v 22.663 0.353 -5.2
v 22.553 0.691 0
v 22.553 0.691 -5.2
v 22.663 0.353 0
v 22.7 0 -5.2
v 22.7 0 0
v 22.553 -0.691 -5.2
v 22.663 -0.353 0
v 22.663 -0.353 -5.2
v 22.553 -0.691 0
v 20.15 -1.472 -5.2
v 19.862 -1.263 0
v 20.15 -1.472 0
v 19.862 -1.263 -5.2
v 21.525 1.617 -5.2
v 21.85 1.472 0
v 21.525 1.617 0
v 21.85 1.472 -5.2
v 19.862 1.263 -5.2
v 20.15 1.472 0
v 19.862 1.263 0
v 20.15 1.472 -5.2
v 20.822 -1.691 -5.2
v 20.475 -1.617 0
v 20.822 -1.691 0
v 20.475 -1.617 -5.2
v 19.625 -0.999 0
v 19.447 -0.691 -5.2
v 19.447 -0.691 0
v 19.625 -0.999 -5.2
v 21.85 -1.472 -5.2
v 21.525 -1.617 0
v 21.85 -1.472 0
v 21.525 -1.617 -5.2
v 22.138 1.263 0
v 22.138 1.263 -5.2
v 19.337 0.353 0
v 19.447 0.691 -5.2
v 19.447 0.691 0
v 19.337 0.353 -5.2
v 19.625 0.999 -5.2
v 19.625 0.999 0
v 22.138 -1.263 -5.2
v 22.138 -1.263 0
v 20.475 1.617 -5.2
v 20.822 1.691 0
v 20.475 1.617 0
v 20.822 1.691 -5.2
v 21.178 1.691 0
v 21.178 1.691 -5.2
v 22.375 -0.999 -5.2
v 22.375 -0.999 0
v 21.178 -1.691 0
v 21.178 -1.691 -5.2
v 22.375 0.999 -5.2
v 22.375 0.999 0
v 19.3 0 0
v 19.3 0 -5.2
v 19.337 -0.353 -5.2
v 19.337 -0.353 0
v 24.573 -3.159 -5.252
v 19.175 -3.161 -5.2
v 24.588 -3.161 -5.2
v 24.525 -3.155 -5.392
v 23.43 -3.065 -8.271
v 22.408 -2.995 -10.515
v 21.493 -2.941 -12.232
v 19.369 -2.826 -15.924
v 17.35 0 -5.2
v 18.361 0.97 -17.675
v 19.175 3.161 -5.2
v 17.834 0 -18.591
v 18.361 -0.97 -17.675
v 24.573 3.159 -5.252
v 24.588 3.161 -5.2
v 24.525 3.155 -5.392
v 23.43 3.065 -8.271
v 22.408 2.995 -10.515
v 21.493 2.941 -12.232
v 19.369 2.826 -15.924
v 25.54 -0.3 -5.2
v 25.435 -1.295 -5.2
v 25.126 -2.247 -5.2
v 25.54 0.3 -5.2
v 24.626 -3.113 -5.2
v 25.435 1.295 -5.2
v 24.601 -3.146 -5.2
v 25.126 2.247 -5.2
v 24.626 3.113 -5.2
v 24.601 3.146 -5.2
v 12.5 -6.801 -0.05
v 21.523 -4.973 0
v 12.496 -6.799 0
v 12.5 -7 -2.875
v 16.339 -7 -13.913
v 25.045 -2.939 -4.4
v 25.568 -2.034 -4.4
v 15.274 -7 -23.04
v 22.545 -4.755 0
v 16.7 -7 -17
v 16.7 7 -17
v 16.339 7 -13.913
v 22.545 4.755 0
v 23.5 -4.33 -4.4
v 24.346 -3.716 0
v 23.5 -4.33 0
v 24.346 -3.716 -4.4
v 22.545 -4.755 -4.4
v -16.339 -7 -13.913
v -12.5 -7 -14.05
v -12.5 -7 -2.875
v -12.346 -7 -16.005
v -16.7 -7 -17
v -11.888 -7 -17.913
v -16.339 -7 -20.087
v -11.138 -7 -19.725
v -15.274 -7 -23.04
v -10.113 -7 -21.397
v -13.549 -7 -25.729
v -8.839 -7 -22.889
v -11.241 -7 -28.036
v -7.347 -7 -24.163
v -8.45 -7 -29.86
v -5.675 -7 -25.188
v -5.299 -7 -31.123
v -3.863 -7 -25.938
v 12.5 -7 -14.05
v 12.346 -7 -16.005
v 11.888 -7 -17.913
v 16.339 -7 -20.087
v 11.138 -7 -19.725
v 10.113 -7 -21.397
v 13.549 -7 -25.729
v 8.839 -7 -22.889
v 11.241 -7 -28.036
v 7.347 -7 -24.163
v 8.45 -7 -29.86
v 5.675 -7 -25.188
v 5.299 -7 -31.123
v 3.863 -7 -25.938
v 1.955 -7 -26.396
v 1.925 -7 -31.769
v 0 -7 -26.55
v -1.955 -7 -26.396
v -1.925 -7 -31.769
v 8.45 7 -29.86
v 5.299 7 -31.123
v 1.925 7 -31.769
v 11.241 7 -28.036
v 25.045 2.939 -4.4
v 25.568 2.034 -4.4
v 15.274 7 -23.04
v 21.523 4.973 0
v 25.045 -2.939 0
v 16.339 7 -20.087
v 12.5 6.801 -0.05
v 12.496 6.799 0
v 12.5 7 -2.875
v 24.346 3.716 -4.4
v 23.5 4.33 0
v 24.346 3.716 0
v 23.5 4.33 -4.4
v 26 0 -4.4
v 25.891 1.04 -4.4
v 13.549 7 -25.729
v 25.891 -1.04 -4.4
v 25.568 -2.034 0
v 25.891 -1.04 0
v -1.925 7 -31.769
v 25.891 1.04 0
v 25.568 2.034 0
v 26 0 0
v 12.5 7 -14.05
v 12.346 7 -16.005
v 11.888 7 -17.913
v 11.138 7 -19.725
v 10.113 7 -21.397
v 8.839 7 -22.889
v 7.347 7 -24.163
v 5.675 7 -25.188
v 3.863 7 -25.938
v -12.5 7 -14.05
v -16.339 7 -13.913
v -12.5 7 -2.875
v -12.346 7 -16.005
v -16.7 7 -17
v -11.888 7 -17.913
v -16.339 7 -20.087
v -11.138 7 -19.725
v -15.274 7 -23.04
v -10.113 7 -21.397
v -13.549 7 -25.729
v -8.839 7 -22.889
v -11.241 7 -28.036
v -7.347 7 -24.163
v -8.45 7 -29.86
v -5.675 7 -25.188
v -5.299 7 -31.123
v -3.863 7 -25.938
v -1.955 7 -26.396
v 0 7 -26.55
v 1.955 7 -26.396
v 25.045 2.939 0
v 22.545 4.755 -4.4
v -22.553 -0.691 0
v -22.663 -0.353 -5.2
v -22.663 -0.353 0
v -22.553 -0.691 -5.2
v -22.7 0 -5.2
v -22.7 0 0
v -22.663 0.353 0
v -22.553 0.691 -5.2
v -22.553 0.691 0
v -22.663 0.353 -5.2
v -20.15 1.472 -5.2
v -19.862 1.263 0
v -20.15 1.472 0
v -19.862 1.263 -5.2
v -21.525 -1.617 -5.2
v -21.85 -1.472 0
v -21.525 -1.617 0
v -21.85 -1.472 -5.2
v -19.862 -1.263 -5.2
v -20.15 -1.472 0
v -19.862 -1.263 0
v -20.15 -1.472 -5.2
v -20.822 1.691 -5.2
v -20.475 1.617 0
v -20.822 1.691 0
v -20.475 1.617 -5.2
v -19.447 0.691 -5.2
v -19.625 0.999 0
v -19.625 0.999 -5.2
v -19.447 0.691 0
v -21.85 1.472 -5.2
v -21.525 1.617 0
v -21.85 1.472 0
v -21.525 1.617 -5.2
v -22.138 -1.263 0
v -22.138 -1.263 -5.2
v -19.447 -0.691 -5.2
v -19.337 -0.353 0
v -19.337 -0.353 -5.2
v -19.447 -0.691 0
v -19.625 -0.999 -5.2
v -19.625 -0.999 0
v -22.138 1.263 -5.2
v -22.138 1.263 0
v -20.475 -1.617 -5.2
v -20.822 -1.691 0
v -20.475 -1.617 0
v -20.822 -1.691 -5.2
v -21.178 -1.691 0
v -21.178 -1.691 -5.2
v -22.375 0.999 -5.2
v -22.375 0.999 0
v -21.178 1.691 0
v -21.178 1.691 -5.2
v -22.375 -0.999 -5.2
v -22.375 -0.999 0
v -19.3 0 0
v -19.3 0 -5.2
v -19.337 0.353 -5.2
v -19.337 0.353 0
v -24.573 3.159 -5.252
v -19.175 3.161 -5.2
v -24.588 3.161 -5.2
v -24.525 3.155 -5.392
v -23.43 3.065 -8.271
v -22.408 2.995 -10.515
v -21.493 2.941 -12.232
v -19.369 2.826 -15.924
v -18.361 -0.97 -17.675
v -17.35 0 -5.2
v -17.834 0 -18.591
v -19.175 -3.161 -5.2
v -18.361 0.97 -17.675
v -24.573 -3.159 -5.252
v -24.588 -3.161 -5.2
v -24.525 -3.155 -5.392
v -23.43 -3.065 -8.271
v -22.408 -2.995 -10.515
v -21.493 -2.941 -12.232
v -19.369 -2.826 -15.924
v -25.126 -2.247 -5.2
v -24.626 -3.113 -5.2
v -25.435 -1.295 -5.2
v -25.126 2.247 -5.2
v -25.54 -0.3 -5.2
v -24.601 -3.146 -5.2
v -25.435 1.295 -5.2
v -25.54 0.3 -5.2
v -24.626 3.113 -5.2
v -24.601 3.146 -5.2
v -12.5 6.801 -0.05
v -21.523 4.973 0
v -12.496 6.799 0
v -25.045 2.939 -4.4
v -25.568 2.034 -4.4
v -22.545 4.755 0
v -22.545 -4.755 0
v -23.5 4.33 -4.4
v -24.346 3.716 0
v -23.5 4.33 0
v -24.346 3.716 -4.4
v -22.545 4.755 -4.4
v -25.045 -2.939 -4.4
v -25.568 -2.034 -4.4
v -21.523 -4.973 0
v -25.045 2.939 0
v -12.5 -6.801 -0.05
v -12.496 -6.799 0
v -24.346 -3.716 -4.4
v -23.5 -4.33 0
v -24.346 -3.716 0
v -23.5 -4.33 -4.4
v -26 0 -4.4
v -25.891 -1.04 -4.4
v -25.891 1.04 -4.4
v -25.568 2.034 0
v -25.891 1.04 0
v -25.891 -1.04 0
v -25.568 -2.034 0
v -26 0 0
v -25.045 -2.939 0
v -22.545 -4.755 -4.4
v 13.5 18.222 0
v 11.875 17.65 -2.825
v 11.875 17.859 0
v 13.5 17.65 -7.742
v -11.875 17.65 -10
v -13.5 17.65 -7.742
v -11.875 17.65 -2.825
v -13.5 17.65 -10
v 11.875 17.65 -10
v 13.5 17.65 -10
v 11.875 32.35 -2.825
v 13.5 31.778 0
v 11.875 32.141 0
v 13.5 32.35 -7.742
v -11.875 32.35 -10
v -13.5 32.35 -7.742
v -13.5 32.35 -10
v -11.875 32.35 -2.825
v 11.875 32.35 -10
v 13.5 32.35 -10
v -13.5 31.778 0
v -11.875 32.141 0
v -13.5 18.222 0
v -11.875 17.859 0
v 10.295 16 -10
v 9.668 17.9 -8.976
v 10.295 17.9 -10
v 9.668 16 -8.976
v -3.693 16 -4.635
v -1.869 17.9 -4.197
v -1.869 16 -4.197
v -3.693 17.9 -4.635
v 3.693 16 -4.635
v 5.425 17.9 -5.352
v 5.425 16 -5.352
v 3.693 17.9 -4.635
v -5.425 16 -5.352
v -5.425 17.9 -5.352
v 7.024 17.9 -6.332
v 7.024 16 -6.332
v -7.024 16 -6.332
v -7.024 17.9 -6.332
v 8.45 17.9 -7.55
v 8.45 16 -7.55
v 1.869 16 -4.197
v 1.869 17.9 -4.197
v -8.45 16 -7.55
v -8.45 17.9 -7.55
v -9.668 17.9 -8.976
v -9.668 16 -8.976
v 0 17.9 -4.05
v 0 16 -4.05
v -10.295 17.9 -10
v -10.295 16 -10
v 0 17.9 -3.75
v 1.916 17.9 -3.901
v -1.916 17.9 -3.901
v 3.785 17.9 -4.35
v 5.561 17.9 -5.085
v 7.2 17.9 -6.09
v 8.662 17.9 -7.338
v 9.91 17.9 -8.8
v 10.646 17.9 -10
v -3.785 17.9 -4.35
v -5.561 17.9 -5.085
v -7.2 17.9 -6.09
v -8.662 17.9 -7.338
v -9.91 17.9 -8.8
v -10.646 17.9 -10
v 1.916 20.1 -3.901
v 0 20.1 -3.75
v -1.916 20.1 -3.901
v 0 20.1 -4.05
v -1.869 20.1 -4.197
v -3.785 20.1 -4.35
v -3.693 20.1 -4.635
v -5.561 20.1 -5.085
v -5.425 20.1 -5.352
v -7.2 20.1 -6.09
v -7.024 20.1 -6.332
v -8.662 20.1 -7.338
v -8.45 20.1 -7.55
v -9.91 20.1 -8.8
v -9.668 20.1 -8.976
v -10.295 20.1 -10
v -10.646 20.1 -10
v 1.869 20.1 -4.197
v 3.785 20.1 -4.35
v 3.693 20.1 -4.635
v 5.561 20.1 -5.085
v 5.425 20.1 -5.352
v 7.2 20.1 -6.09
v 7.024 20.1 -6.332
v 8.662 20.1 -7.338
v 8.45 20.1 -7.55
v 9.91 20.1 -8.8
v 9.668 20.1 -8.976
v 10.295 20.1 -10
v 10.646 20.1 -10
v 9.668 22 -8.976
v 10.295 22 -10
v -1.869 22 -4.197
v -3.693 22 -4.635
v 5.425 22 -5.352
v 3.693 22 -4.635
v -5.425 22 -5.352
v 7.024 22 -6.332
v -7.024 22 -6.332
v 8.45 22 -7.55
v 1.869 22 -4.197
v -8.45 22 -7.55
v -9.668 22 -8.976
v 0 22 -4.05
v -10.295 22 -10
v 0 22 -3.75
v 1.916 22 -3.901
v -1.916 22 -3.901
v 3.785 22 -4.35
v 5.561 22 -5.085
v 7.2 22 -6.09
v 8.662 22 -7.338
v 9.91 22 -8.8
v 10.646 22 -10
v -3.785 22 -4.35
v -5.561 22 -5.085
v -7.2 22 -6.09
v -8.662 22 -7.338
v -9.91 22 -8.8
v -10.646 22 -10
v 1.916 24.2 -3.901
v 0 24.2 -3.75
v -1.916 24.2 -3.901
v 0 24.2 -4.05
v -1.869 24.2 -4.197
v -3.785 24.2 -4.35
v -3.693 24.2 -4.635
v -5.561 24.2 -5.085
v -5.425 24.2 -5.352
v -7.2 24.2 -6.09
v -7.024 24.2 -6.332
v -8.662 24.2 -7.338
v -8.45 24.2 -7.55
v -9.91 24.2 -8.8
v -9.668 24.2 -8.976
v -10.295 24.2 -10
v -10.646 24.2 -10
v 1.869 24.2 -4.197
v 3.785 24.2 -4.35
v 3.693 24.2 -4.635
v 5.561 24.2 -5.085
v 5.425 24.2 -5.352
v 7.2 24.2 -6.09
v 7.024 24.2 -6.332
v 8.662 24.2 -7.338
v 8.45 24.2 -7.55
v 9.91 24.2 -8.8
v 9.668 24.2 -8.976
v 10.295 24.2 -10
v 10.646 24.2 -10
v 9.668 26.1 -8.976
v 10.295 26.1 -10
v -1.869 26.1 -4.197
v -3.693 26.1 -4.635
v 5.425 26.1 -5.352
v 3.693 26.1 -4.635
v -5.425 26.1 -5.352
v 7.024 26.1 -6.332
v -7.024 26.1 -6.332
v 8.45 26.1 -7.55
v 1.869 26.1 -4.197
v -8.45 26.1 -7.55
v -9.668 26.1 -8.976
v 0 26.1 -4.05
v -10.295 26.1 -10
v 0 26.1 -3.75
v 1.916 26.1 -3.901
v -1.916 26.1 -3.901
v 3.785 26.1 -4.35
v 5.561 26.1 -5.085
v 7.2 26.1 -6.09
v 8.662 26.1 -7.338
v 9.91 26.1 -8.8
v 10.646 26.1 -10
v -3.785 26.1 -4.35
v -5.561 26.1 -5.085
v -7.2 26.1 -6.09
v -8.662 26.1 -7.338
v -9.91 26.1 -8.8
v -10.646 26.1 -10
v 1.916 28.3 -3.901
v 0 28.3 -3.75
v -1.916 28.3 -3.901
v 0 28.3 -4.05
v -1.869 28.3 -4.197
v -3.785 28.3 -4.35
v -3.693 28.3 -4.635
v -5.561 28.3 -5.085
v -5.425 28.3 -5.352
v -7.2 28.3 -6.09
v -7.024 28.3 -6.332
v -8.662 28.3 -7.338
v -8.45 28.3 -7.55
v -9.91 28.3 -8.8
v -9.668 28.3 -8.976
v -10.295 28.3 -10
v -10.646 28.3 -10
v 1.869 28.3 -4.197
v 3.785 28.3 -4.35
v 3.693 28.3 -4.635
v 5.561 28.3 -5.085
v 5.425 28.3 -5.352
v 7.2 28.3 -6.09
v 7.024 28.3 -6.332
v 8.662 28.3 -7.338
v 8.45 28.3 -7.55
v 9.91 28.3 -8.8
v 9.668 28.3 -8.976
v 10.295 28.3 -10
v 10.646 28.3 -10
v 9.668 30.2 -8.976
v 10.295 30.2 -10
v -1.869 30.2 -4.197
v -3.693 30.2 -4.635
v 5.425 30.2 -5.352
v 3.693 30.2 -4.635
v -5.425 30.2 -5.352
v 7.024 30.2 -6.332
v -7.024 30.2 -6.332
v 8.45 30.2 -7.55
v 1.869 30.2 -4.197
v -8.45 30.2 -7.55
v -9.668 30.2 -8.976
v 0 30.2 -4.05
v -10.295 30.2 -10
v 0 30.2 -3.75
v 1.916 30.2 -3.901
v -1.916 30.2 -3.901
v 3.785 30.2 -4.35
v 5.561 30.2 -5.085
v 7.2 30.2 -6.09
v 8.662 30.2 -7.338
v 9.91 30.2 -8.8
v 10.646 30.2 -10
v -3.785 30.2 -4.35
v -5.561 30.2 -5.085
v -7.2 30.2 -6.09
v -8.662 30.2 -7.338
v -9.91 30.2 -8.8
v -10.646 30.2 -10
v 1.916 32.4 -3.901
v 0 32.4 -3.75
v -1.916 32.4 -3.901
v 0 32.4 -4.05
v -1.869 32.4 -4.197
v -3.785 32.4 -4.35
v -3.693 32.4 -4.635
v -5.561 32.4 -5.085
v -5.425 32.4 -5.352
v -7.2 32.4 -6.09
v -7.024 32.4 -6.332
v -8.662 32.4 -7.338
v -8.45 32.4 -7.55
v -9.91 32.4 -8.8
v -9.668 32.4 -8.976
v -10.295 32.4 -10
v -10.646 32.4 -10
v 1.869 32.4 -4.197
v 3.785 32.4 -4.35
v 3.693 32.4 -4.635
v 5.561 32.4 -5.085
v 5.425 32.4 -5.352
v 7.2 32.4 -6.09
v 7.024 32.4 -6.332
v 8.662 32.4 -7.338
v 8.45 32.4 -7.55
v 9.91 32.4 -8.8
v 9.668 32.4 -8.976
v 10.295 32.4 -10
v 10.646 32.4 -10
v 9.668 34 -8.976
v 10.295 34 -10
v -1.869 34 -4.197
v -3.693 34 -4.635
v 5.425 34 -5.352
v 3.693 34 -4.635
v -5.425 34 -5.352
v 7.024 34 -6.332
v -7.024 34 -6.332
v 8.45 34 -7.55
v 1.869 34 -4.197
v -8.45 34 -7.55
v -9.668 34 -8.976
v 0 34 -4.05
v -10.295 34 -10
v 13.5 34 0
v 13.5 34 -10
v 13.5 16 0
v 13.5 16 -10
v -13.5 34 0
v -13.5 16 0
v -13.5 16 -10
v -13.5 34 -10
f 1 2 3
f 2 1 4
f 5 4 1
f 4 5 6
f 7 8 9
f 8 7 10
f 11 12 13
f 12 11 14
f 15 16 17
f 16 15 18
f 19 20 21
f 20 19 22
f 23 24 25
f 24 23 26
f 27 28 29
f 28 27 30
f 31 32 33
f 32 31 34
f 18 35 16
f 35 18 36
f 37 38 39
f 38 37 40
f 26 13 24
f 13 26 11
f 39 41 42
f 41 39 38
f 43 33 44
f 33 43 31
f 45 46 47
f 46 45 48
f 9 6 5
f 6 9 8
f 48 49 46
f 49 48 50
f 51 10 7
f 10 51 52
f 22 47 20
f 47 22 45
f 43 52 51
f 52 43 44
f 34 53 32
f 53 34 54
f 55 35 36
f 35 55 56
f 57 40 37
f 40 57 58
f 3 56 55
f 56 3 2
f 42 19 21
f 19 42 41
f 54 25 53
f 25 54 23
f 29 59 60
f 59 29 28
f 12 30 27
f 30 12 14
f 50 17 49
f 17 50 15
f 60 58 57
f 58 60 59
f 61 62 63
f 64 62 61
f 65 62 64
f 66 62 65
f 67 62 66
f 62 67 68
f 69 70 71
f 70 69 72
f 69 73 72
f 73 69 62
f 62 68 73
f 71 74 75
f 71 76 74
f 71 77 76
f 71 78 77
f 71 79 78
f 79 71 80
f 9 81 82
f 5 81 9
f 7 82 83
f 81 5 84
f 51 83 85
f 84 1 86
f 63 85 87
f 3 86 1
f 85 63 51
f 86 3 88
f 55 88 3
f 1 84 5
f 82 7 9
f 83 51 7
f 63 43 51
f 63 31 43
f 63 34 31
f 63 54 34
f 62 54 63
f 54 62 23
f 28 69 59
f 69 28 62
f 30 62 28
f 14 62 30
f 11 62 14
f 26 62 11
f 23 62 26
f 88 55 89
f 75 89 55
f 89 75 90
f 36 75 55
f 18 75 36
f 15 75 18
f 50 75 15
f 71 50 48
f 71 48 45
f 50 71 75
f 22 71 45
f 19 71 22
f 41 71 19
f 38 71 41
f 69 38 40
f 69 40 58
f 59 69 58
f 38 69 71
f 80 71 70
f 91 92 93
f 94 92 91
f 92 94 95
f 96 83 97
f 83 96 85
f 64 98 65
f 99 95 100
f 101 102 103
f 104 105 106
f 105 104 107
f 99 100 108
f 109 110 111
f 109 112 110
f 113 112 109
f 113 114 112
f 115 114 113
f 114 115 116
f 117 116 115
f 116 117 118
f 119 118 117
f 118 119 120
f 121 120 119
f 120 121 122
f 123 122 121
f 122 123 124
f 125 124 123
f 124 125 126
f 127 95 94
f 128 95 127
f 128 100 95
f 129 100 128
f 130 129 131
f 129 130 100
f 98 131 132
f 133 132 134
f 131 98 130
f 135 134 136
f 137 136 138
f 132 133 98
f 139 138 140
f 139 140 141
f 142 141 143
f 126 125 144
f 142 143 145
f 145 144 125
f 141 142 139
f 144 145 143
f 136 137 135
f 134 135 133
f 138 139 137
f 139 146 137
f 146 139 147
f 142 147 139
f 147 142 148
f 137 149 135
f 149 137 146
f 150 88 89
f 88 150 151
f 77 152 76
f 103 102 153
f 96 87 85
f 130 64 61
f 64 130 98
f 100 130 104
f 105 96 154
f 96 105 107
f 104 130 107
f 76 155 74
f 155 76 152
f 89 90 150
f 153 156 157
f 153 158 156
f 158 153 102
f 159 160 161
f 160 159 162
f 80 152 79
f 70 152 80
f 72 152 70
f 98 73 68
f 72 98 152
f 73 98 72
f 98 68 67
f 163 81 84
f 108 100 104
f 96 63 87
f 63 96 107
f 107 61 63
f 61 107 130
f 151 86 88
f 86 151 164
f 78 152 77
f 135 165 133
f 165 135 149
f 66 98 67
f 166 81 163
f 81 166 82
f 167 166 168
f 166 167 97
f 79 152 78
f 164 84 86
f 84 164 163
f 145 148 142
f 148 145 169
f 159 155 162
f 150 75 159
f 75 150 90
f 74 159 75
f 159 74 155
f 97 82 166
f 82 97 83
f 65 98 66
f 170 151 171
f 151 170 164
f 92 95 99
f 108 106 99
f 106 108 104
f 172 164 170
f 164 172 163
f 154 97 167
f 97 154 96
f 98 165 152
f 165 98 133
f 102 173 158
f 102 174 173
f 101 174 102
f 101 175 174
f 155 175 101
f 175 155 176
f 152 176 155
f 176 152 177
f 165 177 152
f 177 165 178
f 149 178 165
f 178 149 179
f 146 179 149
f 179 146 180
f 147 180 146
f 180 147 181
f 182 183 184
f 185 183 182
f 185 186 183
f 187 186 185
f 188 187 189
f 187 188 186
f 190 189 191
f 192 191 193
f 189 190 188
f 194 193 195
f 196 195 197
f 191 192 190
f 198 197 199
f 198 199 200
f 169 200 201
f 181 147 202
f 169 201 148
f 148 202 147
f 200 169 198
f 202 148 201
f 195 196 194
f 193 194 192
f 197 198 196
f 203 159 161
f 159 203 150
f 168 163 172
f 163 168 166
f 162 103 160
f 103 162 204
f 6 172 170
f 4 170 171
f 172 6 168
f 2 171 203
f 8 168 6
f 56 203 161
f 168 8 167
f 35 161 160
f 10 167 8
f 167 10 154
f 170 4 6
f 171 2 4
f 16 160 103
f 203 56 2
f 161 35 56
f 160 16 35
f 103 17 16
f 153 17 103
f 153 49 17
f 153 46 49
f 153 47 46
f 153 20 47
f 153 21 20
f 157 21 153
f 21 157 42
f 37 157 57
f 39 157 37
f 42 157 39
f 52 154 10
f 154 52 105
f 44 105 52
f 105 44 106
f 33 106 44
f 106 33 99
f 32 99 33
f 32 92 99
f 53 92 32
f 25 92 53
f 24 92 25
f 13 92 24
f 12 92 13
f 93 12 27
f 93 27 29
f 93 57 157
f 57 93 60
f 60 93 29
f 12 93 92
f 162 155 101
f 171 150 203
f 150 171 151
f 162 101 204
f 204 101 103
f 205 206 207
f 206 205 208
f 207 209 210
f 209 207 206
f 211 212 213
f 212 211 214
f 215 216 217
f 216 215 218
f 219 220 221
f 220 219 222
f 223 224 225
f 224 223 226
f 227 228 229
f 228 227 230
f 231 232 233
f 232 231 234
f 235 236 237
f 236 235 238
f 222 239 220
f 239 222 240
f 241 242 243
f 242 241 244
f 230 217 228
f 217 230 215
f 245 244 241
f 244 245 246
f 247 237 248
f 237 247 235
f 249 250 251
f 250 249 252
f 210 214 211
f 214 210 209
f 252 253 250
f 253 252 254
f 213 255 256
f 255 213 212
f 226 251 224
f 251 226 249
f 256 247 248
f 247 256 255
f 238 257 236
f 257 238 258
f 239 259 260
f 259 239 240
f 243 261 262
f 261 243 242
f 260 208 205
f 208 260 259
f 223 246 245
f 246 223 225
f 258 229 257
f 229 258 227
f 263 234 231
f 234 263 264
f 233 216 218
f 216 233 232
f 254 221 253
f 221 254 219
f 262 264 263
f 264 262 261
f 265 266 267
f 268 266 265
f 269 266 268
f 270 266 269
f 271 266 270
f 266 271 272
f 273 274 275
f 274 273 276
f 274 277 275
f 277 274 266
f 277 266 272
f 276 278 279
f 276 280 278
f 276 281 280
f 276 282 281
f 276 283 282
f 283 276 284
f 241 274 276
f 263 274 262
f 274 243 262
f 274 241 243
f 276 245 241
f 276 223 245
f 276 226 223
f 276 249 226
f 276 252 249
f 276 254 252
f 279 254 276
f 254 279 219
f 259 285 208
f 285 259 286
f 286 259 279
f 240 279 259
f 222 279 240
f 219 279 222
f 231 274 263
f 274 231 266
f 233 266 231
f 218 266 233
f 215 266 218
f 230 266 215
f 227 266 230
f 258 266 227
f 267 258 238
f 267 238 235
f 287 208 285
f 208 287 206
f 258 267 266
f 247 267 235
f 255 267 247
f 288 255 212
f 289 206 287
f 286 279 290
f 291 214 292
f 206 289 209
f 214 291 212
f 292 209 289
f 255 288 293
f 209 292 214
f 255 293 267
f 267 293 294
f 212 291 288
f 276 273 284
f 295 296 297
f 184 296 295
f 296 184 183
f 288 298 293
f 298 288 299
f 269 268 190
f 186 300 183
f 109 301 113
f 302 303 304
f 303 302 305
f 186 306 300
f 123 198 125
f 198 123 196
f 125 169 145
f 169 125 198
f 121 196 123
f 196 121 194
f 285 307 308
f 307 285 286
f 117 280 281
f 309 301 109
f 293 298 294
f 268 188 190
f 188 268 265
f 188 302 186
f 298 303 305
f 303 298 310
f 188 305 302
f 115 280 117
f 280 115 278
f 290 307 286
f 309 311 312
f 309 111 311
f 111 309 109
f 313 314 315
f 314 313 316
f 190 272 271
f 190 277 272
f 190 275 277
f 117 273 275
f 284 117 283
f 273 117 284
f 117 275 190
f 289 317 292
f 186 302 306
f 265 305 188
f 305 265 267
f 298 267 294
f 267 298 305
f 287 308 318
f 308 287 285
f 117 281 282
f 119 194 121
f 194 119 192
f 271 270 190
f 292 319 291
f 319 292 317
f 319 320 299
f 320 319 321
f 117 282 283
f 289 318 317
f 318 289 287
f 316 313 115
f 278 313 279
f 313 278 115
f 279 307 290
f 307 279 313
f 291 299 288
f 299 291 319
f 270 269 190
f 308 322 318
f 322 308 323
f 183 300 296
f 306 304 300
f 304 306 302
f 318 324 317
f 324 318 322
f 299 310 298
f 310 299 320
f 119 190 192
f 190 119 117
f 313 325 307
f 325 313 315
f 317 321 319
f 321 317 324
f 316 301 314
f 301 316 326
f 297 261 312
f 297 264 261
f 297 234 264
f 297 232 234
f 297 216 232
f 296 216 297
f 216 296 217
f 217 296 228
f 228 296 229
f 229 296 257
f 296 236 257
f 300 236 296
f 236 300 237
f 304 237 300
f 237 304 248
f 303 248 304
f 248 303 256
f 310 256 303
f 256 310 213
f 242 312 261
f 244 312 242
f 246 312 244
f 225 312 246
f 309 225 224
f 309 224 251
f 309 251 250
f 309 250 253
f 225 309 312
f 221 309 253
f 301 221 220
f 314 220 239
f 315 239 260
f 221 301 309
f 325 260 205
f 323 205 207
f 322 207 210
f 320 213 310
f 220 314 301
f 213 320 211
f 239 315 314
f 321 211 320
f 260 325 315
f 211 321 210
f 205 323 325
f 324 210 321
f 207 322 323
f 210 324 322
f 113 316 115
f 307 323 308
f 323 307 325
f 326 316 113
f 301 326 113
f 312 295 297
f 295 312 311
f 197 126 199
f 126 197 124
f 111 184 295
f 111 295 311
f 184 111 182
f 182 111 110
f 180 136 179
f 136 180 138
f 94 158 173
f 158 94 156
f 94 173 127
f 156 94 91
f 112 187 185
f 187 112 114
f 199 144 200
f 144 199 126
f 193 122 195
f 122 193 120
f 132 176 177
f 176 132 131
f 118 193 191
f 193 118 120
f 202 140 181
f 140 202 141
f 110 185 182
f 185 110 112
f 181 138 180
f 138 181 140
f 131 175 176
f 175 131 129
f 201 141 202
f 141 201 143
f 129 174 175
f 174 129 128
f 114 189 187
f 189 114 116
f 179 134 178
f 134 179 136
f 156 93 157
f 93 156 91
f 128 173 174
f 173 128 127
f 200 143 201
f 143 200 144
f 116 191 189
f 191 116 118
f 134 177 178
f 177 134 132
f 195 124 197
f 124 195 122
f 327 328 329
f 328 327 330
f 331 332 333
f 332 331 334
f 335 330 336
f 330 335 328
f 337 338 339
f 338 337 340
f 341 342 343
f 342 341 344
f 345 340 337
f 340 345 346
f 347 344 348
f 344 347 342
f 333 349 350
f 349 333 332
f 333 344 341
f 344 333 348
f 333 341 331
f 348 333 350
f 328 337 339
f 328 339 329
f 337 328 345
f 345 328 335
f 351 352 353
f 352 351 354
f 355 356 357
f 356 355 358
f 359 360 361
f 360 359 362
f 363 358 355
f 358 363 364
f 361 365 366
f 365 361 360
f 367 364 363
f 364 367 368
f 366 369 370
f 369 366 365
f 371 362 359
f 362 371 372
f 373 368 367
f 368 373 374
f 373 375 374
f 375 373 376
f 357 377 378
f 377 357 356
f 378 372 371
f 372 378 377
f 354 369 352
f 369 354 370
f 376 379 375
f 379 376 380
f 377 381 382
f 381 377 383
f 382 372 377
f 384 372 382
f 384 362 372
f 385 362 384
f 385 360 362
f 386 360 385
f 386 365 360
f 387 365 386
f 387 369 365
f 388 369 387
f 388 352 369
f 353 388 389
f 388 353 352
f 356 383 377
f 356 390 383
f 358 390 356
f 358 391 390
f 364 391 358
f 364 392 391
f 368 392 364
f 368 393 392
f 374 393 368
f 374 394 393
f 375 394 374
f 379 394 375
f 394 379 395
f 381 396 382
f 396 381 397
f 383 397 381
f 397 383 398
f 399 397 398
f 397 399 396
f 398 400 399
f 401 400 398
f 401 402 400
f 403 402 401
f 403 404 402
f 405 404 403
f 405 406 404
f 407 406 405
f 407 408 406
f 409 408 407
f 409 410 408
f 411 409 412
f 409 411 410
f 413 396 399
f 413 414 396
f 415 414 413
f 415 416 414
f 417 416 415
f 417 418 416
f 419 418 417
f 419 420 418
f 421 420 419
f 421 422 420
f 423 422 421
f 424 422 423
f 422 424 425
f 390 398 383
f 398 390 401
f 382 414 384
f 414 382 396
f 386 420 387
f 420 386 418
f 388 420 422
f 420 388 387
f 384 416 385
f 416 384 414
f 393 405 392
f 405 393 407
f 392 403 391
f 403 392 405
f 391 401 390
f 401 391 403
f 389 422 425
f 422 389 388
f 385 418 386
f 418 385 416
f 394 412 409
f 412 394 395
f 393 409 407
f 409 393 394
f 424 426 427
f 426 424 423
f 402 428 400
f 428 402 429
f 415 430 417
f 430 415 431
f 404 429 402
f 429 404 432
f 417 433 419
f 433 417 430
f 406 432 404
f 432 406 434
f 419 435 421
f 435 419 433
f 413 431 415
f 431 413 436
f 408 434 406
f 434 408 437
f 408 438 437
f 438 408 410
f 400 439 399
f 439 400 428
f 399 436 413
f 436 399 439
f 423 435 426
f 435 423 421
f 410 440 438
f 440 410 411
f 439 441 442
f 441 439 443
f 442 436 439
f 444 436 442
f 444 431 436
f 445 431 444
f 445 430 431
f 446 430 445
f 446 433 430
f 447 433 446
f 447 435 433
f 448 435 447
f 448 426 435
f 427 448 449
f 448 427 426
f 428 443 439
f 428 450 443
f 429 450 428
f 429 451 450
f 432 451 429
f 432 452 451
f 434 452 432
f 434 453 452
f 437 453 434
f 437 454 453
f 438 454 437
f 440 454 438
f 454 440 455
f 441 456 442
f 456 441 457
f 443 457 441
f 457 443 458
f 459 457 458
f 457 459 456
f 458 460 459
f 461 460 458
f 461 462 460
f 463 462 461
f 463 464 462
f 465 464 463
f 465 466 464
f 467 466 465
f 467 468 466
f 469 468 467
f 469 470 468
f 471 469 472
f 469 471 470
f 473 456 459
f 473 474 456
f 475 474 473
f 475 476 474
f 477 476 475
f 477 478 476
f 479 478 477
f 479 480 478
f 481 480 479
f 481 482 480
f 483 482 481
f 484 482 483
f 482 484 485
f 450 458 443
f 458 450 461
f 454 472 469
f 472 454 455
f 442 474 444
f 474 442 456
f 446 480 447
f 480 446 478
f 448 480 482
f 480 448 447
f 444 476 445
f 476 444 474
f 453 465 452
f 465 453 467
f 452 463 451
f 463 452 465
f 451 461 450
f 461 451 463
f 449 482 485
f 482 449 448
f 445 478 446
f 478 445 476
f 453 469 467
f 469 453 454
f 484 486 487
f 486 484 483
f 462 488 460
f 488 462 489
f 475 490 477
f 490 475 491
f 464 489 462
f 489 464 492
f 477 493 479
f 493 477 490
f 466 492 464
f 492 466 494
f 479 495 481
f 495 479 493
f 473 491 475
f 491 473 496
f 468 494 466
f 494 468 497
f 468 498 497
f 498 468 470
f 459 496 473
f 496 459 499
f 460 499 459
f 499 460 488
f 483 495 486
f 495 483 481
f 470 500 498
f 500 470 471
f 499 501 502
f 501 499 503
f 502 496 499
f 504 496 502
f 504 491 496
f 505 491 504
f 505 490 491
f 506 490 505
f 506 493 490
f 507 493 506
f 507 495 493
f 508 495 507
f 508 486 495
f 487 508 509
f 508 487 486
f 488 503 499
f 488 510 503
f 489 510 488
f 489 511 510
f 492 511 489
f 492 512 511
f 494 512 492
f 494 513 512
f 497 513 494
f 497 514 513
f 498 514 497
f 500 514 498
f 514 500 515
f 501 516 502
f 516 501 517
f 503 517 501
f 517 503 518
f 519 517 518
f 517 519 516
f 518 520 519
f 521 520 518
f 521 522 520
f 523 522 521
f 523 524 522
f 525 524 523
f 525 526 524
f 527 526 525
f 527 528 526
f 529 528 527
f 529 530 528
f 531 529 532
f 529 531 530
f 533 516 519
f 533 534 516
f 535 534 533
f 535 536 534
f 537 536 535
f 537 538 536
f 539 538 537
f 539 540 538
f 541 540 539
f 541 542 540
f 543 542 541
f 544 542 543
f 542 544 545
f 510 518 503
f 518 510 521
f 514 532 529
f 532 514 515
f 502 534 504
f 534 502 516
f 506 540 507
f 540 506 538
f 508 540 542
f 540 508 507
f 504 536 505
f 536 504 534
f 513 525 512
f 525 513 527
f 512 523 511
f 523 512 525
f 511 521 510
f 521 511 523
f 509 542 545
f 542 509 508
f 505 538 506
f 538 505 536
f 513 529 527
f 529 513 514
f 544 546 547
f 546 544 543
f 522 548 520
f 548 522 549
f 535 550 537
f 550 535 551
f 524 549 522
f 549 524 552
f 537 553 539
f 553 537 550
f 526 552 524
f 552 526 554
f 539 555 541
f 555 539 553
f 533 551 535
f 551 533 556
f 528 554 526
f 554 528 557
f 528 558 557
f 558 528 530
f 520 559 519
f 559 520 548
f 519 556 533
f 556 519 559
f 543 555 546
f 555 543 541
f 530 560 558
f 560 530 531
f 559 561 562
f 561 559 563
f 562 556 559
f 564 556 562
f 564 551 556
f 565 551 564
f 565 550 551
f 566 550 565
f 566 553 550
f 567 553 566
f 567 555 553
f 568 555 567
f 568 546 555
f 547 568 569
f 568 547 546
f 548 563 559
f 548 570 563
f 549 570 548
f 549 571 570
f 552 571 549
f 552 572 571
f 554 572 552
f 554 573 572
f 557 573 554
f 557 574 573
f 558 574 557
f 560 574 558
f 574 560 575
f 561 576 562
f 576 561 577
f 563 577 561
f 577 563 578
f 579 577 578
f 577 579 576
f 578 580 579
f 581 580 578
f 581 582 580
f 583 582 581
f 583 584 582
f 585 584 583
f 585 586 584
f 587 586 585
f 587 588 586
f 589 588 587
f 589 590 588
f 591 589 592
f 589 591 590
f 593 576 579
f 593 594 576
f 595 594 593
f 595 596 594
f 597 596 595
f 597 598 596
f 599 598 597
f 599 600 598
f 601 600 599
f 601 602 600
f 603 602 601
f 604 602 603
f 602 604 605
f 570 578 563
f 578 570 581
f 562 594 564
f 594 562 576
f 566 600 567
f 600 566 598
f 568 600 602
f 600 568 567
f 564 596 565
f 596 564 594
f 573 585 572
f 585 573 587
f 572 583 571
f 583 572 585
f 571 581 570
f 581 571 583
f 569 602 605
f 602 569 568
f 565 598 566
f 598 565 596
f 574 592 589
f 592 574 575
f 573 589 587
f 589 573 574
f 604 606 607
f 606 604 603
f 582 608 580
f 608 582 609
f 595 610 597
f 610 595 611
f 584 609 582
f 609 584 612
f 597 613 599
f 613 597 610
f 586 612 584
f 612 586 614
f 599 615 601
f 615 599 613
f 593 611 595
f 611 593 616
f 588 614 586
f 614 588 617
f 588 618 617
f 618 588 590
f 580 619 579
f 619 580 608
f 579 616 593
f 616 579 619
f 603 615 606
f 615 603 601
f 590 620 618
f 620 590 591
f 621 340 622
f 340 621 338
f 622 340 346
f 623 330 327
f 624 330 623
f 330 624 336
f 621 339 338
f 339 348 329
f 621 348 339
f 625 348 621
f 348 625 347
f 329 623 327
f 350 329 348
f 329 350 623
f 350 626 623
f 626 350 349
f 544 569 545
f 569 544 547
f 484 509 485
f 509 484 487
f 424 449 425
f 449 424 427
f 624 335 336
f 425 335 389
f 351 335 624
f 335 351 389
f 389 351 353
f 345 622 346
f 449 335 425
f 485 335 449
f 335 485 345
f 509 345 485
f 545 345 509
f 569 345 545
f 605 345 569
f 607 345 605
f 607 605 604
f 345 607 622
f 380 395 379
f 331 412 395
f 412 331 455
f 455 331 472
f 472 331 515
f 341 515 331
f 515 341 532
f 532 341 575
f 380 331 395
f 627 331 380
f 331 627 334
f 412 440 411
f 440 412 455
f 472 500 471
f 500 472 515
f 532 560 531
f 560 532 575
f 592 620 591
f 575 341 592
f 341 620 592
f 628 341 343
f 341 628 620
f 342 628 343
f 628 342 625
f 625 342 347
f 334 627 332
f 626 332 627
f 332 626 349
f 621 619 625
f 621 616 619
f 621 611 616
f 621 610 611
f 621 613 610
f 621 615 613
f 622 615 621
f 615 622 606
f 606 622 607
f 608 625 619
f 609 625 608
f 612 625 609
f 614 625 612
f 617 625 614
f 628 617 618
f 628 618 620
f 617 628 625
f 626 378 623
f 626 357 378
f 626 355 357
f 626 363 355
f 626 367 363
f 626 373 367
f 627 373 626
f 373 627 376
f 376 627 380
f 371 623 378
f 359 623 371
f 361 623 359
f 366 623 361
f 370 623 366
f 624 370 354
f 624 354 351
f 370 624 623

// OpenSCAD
//CUSTOMIZER VARIABLES

InnerDiameter = 25;       //inner diameter 
OuterDiameter = 33;       //outer diameter
clampHight = 16;             // high of p2 part


// Which one would you like to see?
part = "both"; // [first:Barmount_sleve-print_PLA ,second:Clamp_cube-print_FLEX ,both:Sleve and Clamp]

module both(){
    translate([0,0,-0.05]){barmount();}    // print from PLA, disable with "*" for export to stl
    translate([0,25,0]){barmount_p2();}  // print from FLEX, disable with "*" for export to stl
    }
    

module barmount_sleve_PLA(){
    translate([0,0,-0.05]){barmount();}    // print from PLA, disable with "*" for export to stl
    }
    

module clamp_cube_FLEX(){
    translate([0,25,0]){barmount_p2();}  // print from FLEX, disable with "*" for export to stl
    }

/* [Hidden] */

  //recalculation
  Rin= InnerDiameter /2;
  Rout= OuterDiameter /2;
  h= clampHight;
  
  

  
module print_part() {
	if (part == "first") {
		barmount_sleve_PLA();
	} else if (part == "second") {
		clamp_cube_FLEX();
	} else if (part == "both") {
		both();
	} else {
		both();
	}
}  
  
module mounthole1(){
    difference(){   
        union(){  
            hull(){
                translate([-10.5,0,-3.8]){cube([2,14,10],true);}
                translate([-20.8, 0, -15.8]){
                rotate([90,0,0]){scale([1,0.9,1]){cylinder(14,Rout,Rout,true, $fn=30);}}}
                translate([0,0,-1]){ cylinder(4.4,5,5,true, $fn=30);}}}
        
        
        union(){
           cylinder(10,1.7,1.7,true, $fn=30);    
           translate([0,0,-13]){cylinder(18, 3, 7.3/2,true, $fn=6);}
           translate([3,0,-13]){cylinder(18, 3, 7.3/2,true, $fn=6);}
            }}
}
module barmount(){

    difference(){
        union(){
            translate([21,0,-1.15])mounthole1();
            translate([-21,0,-1.15])rotate([0,0,180]){mounthole1();    }}
        
        union(){
            hull(){
                translate([0,0,-14]){rotate([90,0,0]){cylinder(16,Rin,Rin,true,$fn=40); }}
                translate([0,0,0]){rotate([90,0,0]){cylinder(16, Rin, Rin,true,$fn=40);  } }}}    
    }
}

module barmount_p2(){
  
    difference(){
        union(){
           translate([-Rin-1, -18/2, -h+6])cube([Rin*2+2,18,h-6],false);}
            
        union(){
            scale([0.95,1.05,1]){barmount();}
        for(yuy =[-8: 4.1: 8.4]){
            translate([0,yuy,-h]){rotate([90,0,0]){cylinder(2.2, 23.9/2, 23.9/2,true,$fn=40); }}
            translate([0,yuy+2, -h]){rotate([90,0,0]){cylinder(2.2, 24.5/2, 24.5/2,true,$fn=40);}}}
        }
    }
}
            
 
print_part();
    
       
        
